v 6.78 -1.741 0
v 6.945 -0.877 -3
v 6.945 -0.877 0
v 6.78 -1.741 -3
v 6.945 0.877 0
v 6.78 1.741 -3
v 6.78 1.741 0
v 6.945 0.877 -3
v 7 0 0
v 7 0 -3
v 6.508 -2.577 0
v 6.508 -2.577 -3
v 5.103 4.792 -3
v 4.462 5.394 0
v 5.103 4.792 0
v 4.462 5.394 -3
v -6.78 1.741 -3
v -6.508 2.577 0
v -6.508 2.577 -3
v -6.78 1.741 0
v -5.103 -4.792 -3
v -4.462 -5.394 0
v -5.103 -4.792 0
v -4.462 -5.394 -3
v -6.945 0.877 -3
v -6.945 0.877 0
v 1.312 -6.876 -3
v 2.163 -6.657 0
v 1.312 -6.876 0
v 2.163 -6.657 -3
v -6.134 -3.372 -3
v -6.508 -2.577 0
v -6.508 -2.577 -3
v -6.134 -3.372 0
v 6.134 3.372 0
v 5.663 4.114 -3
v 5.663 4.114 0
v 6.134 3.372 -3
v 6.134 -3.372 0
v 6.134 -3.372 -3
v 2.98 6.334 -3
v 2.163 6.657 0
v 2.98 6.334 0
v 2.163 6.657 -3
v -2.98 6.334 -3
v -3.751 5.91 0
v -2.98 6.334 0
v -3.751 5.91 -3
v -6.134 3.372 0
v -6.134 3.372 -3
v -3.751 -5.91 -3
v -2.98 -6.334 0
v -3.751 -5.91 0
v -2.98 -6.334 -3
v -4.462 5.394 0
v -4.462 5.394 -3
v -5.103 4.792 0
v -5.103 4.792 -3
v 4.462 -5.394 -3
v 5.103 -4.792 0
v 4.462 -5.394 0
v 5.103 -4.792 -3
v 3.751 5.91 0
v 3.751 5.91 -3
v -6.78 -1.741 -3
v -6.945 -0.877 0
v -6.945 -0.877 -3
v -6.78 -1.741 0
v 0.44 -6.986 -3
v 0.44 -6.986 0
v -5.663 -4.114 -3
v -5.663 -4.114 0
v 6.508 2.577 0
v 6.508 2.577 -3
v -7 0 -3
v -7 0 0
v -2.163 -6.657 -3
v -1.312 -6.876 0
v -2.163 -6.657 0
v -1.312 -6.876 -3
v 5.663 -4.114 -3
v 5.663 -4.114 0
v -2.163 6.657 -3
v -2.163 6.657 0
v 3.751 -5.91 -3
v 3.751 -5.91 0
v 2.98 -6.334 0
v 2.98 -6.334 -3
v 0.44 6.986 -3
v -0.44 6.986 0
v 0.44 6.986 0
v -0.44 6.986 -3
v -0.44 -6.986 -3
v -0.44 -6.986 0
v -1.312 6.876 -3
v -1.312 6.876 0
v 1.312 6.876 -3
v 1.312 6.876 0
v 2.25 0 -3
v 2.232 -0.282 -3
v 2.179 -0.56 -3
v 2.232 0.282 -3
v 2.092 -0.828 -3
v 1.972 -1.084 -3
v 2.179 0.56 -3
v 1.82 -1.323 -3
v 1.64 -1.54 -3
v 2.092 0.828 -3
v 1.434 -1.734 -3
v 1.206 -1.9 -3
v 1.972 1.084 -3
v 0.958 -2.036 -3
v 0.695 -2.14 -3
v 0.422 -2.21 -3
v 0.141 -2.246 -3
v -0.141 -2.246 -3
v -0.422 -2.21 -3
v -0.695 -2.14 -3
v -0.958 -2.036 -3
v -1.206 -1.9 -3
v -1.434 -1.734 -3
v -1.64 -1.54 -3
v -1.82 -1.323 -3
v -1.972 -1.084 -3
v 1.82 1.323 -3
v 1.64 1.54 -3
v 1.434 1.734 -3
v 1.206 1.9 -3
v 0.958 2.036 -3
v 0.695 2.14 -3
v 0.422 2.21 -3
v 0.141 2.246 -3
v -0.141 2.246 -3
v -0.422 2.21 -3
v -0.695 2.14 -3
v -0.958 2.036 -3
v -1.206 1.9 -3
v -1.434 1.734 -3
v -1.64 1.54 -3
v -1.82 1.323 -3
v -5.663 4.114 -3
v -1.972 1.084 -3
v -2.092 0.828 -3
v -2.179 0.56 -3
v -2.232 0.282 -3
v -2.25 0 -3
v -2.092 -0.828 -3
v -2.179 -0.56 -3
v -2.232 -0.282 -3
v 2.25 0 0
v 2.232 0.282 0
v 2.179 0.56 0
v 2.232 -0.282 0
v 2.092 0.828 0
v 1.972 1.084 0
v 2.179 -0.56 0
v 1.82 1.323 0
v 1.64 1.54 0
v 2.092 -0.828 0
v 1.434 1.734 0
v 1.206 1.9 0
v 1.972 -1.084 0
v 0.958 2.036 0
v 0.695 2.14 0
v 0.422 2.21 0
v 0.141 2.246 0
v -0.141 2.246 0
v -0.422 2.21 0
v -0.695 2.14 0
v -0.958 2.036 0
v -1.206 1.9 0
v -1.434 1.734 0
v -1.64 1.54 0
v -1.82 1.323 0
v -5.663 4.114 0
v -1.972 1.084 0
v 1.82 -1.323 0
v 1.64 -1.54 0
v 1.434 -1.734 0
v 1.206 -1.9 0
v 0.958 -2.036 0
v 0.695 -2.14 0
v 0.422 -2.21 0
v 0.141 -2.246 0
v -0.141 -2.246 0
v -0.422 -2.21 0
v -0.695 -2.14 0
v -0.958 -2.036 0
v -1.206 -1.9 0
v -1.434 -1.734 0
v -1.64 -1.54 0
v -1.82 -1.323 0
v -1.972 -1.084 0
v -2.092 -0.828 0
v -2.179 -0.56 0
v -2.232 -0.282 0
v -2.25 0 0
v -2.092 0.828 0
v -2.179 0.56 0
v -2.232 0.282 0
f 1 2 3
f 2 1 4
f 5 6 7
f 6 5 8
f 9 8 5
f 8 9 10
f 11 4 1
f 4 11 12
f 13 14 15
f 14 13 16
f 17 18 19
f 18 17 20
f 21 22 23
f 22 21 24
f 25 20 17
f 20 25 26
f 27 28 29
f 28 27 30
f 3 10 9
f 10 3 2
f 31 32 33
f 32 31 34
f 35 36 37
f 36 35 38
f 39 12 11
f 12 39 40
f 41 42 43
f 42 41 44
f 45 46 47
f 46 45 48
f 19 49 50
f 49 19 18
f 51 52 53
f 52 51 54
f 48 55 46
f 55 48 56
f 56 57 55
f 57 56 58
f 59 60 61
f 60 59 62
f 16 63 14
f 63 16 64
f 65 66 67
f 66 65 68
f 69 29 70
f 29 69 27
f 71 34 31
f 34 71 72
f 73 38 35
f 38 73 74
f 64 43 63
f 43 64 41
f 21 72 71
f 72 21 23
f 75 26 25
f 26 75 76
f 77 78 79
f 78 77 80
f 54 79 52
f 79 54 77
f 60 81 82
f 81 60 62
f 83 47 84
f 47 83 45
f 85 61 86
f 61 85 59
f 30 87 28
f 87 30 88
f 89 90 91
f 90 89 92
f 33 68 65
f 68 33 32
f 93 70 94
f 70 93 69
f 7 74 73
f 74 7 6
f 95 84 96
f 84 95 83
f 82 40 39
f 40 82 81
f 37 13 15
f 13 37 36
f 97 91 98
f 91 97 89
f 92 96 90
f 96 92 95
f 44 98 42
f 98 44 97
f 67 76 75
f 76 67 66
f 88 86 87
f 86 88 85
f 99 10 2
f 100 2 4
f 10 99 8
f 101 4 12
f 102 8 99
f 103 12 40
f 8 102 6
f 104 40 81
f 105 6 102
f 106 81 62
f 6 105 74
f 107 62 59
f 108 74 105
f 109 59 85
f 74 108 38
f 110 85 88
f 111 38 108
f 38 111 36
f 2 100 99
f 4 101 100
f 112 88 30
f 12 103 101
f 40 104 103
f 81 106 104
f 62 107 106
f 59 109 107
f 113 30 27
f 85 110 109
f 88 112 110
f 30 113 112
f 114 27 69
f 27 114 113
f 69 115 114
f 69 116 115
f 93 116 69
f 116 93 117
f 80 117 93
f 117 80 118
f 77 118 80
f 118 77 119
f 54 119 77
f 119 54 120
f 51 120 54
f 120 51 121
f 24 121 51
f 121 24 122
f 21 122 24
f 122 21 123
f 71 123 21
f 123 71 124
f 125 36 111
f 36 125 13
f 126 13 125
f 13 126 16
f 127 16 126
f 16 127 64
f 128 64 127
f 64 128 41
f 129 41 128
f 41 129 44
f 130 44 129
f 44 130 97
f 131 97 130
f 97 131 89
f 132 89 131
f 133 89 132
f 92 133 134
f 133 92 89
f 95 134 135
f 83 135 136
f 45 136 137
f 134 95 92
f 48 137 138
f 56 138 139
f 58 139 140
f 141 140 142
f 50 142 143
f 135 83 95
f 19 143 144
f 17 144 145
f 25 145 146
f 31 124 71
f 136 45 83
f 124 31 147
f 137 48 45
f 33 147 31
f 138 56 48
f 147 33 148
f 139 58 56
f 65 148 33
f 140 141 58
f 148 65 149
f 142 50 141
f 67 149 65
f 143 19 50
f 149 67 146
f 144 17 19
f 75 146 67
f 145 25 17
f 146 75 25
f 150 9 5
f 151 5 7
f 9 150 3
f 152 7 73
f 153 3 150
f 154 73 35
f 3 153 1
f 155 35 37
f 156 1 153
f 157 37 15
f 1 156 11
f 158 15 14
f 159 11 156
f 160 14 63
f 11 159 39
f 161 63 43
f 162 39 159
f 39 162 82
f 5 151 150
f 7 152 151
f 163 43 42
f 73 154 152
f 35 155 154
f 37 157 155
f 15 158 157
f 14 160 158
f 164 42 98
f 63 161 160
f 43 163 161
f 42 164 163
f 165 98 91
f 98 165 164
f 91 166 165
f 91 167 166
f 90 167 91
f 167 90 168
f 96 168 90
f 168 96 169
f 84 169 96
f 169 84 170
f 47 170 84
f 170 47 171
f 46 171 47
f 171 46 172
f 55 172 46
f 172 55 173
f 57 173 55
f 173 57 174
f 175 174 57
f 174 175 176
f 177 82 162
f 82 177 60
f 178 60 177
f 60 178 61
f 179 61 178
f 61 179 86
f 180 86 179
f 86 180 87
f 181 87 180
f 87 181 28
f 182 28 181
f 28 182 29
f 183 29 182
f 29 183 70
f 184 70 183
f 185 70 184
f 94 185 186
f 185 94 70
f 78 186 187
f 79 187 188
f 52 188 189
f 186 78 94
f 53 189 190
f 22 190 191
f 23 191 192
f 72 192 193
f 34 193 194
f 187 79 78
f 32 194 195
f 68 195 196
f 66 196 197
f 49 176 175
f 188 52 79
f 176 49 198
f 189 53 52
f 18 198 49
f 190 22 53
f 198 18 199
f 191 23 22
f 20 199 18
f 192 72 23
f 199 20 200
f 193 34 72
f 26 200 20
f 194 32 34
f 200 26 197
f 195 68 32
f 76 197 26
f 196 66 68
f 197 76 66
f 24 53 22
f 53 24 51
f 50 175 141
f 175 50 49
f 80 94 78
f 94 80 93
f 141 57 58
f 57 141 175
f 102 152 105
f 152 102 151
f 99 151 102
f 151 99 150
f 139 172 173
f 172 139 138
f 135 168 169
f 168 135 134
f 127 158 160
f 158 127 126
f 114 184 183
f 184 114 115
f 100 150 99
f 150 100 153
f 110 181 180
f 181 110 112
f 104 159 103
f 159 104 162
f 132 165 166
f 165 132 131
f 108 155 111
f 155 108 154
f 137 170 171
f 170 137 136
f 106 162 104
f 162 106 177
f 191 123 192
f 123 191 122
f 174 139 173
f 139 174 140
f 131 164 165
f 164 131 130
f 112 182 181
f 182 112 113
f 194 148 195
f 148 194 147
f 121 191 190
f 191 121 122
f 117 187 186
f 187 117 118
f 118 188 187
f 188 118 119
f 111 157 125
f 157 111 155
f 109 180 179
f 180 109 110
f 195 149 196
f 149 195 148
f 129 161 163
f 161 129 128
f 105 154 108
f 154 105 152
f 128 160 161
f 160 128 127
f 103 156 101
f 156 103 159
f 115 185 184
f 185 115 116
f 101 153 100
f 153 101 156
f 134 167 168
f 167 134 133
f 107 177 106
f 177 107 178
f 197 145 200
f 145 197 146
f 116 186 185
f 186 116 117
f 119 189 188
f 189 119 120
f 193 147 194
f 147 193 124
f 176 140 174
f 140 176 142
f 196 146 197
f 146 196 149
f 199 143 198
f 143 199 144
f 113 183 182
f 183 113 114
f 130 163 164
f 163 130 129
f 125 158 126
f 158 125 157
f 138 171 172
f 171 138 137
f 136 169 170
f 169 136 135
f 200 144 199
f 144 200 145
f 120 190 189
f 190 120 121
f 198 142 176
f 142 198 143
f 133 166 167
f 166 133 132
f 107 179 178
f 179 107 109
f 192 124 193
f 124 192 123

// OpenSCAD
$fn = 50;


difference() {
	union() {
		translate(v = [0, 0, -3.0000000000]) {
			cylinder(h = 3, r = 7.0000000000);
		}
		cylinder(h = 0, r = 10.0000000000);
	}
	union() {
		#translate(v = [0, 0, -3]) {
			cylinder(h = 3, r = 2.2500000000);
		}
	}
}
